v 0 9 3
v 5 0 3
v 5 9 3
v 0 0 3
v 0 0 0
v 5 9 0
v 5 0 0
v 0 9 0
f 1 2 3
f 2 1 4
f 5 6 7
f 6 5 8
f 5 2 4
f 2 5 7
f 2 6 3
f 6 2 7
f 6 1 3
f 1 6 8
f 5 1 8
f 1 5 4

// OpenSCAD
// Generated by SolidPython 1.0.1 on 2020-07-29 00:46:54


cube(size = [5, 9, 3]);
/***********************************************
*********      SolidPython code:      **********
************************************************
 
# import packages: SolidPython
from solid import *
from solid.utils import *
from itertools import chain, combinations, permutations


class Resize:

    def __init__(self, scad_file):
        self.scad_file = scad_file
        #self.scad_file = import_scad(scad_file)
        # cone/cylinder param:
        self.r1 = 0
        self.r2 = 0
        self.h = 0
        # rectangular prism param:
        self.w = 0
        self.l = 0
        # ellipse param:
        self.r = 0

    # import OpenScad code (file name corresponds to shape)


    # classify shape + parameters
    def assign(self, param1, param2, param3):
        if self.scad_file == 'cone.scad':
            self.r1 = param1
            self.r2 = param2
            self.h = param3
        elif self.scad_file == 'cylinder.scad':
            self.r1 = param1
            self.r2 = param2
            self.h = param3
        elif self.scad_file == 'rectangularPrism.scad':
            self.h = param1
            self.l = param2
            self.w = param3
        else:
            self.r = param1
            self.h = param2

    # resize parameters
    def iterate(self):
        x = range(3, 20, 2)
        i = 1
        if self.scad_file == 'cone.scad':
            tempList = list(permutations(x, 2))
            for temp in tempList:
                param1 = temp[0]
                param2 = temp[1]
                filepath = 'produced_scad_files/' + 'cone' + str(param1) + '_' + str(param2) + '_' + '.scad'
                scad_render_to_file(cylinder(h=param1, r1=param2, r2=0), filepath)

        elif self.scad_file == 'cylinder.scad':
            tempList = list(permutations(x, 3))
            for temp in tempList:
                param1 = temp[0]
                param2 = temp[1]
                filepath = 'produced_scad_files/' + 'cylinder' + str(param1) + '_' + str(param2) + '_' + '.scad'
                scad_render_to_file(cylinder(h=param1, r1=param2, r2=param2), filepath)

        elif self.scad_file == 'rectangularPrism.scad':
            tempList = list(permutations(x, 3))
            for temp in tempList:
                param1 = temp[0]
                param2 = temp[1]
                param3 = temp[2]
                filepath = 'produced_scad_files/' + 'rectangularPrism' + str(param1) + '_' + str(param2) + '_' + str(
                    param3) + '.scad'
                scad_render_to_file(cube(size=(param1, param2, param3)), filepath)

        elif self.scad_file == 'ellipse.scad':
            tempList = list(permutations(x, 4))
            for temp in tempList:
                param1 = temp[0]
                param2 = temp[1]
                param3 = temp[2]
                param4 = temp[3]
                filepath = 'produced_scad_files/' + 'ellipse' + str(param1) + '_' + str(param2) + '_' + str(param3) + '_' + str(param4) + '.scad'
                scad_render_to_file(scale([param1, param2, param3])(sphere(r=param4)), filepath)

    def render_to_scadfile(self):
        scad_render_to_file(scad, 'example.scad') 
 
************************************************/
